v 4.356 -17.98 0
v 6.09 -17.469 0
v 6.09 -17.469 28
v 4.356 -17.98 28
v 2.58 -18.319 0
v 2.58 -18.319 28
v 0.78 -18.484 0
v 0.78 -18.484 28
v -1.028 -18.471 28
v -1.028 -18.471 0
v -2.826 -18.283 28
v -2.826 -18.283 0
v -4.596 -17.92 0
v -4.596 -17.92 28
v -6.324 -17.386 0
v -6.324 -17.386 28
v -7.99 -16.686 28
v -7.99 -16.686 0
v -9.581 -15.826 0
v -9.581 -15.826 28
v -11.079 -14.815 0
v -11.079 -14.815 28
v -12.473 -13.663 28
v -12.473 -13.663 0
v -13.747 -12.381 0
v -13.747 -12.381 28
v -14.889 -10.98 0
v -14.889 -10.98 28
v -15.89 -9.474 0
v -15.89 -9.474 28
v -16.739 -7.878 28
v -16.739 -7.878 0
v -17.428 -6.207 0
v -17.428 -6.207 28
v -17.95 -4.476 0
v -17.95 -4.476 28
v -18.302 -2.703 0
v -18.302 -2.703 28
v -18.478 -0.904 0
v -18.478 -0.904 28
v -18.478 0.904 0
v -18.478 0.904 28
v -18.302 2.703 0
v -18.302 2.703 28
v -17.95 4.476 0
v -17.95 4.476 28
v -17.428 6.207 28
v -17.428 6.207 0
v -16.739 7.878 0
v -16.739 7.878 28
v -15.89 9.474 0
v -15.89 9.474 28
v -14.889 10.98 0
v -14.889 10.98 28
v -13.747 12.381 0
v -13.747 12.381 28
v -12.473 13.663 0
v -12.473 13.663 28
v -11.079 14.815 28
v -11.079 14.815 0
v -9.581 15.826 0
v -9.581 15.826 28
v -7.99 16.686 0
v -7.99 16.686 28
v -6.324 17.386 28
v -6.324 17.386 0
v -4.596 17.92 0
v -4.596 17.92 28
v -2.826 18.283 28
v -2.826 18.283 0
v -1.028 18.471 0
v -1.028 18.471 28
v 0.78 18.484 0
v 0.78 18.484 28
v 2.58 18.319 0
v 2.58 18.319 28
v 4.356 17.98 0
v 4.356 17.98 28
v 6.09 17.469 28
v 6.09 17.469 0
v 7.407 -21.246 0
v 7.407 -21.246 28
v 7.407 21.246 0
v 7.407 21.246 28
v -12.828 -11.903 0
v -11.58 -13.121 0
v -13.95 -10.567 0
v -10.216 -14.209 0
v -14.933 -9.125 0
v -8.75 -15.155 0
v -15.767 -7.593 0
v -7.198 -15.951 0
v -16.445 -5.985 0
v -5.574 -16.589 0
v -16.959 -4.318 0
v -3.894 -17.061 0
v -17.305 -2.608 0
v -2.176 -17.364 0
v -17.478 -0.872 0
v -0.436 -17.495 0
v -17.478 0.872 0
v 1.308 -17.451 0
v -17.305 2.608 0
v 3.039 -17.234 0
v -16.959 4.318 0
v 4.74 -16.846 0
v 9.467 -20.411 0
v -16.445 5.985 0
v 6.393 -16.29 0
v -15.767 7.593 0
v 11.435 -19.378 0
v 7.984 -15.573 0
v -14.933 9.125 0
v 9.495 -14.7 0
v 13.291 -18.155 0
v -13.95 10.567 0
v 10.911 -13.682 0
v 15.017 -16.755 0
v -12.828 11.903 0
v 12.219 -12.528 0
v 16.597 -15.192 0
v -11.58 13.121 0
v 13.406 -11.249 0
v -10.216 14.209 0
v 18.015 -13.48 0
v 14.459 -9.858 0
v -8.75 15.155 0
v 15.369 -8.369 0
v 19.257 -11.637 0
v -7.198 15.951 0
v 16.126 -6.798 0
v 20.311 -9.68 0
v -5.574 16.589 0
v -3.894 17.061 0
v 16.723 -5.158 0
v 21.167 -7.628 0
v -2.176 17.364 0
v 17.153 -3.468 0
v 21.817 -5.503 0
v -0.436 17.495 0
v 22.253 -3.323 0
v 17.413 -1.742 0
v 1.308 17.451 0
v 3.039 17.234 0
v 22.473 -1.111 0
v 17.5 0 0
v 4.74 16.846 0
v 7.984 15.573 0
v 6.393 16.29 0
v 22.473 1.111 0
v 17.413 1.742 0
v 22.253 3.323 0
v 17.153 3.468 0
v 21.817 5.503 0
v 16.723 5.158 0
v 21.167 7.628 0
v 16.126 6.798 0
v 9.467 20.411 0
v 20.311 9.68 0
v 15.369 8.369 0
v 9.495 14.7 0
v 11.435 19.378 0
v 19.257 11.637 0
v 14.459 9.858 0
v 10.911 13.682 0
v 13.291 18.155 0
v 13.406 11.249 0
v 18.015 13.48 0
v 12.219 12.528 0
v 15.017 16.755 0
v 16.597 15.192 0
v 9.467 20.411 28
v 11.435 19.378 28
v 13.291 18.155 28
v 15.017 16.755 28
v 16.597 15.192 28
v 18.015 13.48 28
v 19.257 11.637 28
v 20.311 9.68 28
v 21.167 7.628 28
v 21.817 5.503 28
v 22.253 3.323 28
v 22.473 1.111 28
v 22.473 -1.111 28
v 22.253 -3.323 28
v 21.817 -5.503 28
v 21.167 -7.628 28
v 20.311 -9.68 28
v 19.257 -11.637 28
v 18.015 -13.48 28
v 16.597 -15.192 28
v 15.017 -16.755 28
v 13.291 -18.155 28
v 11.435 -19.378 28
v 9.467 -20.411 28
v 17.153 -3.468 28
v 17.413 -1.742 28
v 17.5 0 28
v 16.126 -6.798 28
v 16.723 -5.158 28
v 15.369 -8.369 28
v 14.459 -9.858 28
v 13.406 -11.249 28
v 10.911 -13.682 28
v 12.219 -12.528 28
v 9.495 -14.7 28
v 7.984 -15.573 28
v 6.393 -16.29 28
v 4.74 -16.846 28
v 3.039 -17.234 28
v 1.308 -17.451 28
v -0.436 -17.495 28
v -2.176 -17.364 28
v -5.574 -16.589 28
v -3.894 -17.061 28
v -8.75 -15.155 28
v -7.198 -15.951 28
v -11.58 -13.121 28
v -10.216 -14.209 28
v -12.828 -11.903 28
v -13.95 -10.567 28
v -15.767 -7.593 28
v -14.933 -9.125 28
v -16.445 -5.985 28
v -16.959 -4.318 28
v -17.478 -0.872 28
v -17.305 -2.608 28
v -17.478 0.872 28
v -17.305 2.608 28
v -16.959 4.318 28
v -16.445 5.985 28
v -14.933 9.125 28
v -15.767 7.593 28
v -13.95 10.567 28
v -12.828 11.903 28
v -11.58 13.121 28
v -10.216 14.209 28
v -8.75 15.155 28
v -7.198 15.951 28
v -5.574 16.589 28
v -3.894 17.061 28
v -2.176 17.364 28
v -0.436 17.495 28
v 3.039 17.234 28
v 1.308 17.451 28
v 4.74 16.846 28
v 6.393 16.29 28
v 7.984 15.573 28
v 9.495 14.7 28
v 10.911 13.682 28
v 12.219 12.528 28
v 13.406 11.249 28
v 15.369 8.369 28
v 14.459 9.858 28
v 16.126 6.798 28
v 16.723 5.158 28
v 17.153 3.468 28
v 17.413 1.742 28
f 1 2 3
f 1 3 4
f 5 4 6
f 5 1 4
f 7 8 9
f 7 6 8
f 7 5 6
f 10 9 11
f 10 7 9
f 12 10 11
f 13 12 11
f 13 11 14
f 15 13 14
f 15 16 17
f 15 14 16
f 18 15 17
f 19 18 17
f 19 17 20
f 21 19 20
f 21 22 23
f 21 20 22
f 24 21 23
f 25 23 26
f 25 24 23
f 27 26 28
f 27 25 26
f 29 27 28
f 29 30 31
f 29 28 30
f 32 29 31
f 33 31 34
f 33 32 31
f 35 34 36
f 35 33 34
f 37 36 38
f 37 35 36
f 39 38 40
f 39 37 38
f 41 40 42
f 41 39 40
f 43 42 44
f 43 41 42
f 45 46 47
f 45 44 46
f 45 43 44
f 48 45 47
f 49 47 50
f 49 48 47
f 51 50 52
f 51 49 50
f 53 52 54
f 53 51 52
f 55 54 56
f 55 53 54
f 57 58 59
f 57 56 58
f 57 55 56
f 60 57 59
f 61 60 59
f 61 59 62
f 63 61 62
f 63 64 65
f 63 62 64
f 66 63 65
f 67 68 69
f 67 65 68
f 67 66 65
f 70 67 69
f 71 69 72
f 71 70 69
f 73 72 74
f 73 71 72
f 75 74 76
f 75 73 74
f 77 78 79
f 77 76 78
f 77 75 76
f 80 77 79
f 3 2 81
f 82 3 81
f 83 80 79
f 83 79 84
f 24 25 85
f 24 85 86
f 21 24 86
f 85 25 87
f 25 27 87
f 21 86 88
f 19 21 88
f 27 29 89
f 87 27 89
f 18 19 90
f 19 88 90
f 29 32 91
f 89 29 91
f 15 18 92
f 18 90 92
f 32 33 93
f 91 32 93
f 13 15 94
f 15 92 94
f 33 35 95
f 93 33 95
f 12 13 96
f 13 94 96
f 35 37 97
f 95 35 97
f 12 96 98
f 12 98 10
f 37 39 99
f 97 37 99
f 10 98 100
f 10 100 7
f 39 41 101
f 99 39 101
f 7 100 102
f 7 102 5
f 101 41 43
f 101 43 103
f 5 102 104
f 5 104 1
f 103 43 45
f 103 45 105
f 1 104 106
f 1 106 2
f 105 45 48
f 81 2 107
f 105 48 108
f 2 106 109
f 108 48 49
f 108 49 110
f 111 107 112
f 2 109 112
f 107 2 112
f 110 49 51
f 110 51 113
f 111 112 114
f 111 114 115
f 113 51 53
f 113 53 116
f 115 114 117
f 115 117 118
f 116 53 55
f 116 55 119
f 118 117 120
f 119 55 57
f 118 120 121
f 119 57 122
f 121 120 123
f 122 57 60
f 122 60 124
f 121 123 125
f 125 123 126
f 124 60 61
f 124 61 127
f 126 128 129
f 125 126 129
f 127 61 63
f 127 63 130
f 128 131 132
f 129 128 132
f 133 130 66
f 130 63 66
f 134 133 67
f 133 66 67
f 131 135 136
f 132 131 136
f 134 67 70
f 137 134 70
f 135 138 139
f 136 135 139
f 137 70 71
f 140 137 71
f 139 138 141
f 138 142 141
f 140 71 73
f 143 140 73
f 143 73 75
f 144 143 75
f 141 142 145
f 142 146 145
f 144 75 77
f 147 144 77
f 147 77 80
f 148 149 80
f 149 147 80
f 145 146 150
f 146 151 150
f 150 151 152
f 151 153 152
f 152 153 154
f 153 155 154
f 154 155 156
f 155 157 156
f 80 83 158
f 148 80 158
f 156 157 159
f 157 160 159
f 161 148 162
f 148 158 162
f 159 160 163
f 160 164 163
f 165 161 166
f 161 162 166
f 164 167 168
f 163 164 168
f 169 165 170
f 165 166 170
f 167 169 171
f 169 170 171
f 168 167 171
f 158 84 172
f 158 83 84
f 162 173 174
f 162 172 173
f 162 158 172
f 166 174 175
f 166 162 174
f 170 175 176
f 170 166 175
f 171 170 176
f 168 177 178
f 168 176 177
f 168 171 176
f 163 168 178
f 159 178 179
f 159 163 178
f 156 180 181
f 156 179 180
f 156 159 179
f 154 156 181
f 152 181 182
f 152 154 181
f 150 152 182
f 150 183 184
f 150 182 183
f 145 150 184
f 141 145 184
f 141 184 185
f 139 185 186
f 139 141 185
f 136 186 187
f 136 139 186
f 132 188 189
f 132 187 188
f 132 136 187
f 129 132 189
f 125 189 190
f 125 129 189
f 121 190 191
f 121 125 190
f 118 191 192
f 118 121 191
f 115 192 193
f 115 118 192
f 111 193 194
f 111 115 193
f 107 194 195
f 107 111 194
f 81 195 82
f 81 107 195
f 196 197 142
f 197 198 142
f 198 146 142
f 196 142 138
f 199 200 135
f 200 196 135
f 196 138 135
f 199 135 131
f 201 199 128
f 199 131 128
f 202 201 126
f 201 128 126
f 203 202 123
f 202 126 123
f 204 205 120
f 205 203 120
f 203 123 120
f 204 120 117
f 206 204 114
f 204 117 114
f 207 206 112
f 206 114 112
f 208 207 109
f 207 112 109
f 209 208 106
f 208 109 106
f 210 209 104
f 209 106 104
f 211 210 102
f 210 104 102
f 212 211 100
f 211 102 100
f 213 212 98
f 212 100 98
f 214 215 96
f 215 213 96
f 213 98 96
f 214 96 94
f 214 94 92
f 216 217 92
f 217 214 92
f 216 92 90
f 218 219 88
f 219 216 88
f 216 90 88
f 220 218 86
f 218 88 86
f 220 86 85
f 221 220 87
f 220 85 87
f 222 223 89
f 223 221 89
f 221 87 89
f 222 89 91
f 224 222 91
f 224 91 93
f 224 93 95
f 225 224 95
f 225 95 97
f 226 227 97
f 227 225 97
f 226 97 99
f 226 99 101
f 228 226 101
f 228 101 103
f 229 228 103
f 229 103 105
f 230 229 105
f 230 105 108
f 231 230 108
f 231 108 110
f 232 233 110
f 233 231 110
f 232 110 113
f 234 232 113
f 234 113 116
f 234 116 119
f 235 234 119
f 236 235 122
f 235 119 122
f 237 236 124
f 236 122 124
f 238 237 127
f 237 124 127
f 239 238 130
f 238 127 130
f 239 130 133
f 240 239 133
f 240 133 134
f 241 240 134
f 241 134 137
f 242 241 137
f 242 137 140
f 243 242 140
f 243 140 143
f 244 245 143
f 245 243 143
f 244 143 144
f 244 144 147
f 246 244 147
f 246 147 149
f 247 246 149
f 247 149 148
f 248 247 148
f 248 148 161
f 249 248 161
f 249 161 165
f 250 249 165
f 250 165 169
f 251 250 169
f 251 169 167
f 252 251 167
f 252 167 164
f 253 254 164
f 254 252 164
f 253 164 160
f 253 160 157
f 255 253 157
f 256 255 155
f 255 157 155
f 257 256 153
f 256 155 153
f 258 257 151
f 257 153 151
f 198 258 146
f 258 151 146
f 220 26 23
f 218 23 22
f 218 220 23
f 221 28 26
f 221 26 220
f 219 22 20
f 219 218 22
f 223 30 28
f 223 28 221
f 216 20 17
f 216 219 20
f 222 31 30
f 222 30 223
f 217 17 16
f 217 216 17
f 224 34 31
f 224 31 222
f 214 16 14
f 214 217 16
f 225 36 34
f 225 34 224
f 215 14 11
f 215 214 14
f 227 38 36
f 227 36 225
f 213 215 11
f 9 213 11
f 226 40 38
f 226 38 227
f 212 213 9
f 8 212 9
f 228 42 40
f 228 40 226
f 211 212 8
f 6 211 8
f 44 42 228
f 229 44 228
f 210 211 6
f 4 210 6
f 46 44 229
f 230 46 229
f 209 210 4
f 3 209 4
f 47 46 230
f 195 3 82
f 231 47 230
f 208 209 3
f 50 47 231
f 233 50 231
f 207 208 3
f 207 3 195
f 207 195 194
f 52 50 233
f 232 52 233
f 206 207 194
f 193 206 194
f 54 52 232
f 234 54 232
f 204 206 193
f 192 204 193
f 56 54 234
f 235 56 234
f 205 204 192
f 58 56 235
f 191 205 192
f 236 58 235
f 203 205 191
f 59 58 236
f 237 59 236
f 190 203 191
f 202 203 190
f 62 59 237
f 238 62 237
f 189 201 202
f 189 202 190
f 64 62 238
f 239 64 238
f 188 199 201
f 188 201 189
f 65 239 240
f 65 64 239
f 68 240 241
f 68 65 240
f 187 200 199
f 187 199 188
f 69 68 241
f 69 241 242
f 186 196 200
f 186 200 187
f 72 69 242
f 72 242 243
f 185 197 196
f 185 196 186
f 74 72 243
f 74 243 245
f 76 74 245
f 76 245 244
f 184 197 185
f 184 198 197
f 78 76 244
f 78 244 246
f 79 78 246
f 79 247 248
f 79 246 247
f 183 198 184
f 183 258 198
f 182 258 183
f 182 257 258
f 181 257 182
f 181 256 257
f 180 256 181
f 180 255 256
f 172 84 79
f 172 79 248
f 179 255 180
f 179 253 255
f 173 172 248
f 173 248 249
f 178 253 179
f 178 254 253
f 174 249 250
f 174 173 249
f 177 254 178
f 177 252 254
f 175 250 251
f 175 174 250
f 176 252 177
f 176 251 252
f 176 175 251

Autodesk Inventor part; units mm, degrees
ref_plane "YZ Plane" through (0, 0, 0) normal (1, 0, 0) x (0, 1, 0)
ref_plane "XZ Plane" through (0, 0, 0) normal (0, 1, 0) x (-1, 0, 0)
ref_plane "XY Plane" through (0, 0, 0) normal (0, 0, 1) x (1, 0, 0)
sketch "Sketch1" plane through (0, 0, 0) normal (0, 0, 1) x (1, 0, 0)
  circle A0 centre (0, 0) radius 17.5
  arc A1 (7.4068, -21.2459) -> (7.4068, 21.2459) centre (0, 0) ccw
  arc A2 (6.0901, 17.4689) -> (6.0901, -17.4689) centre (0, 0) ccw
  line L0 (5.7609, 21.75) -> (5.7609, 16.5246) construction
  line L1 (5.7609, -16.5246) -> (5.7609, -21.75) construction
  line L2 (6.0901, -17.4689) -> (7.4068, -21.2459)
  line L3 (6.0901, 17.4689) -> (7.4068, 21.2459)
  dimension "d0" = 35
  dimension "d1" = 45
  dimension "d2" = 43.5
  dimension "d3" = 37
  dimension "d4" = 1.646
  dimension "d5" = 0.5041
  dimension "d6" = 1.646
  dimension "d7" = 0.5041
extrude "Extrusion1" add sketch "Sketch1" along normal blind 28
properties part number "PG35LHeatSink"
